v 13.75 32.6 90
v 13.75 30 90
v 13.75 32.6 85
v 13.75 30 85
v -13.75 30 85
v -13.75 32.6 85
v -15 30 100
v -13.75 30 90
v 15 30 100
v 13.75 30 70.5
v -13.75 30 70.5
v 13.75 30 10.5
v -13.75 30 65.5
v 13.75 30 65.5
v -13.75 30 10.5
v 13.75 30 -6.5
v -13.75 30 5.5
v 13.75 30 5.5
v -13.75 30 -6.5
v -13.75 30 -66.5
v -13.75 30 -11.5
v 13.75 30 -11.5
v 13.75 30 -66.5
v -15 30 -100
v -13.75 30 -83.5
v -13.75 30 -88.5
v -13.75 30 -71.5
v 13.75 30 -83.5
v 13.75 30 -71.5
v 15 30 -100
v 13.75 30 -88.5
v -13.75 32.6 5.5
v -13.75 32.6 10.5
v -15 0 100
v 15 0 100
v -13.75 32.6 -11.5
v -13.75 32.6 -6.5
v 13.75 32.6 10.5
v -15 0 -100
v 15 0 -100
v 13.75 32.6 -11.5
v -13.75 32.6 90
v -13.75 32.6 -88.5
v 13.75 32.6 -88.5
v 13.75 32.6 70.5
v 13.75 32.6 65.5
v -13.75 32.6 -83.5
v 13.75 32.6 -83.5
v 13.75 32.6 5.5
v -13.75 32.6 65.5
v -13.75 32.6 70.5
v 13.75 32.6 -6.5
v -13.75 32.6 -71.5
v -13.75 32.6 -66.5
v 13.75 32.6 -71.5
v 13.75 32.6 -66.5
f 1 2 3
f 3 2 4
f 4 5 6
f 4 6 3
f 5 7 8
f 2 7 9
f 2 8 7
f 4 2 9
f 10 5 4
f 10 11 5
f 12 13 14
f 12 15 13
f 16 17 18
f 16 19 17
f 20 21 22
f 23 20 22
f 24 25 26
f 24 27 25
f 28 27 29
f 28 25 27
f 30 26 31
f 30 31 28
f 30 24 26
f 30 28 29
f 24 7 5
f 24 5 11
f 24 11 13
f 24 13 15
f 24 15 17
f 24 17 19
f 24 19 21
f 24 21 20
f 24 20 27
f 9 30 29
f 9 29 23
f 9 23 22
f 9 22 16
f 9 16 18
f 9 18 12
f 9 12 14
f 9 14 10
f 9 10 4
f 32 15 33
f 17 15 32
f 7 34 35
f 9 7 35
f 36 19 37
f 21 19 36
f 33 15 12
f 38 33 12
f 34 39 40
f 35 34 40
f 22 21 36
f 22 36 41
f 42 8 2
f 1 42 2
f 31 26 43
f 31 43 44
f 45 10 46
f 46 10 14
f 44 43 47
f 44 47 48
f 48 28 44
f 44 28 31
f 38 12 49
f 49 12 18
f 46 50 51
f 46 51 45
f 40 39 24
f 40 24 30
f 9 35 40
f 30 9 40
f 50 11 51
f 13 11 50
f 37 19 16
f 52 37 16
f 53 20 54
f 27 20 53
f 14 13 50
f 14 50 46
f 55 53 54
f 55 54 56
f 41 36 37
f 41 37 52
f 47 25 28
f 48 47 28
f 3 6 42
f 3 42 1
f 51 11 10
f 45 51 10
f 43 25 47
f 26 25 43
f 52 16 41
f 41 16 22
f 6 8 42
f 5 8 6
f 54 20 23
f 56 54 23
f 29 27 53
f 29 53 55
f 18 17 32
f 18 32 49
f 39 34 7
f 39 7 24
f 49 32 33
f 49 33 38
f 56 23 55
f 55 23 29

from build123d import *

# Parameters (mm, degrees)
SKETCH1_W           = 30
SKETCH1_H           = 200
BOSS_EXTRUDE1_DEPTH = 30
SKETCH3_W           = 27.5
SKETCH3_H           = 5
BOSS_EXTRUDE2_DEPTH = 2.6


with BuildPart() as part:
    # Sketch1 → Boss-Extrude1 (new body)
    with BuildSketch(Plane(origin=(0, 0, 0), x_dir=(1, 0, 0), z_dir=(0, 1, 0))):
        Rectangle(SKETCH1_W, SKETCH1_H)
    extrude(amount=BOSS_EXTRUDE1_DEPTH)

    # Sketch3 → Boss-Extrude2 (add)
    with BuildSketch(Plane(origin=(0, 30, 0), x_dir=(1, 0, 0), z_dir=(0, 1, 0))):
        with Locations((0, -87.5)):
            Rectangle(SKETCH3_W, SKETCH3_H)
    boss_extrude2 = extrude(amount=BOSS_EXTRUDE2_DEPTH)

    # Sketch-Pattern1: Boss-Extrude2 at 5 more places
    with Locations((0, 0, -19.5), (0, 0, -79.5), (0, 0, -96.5), (0, 0, -156.5), (0, 0, -173.5)):
        add(boss_extrude2)


solid = part.part
